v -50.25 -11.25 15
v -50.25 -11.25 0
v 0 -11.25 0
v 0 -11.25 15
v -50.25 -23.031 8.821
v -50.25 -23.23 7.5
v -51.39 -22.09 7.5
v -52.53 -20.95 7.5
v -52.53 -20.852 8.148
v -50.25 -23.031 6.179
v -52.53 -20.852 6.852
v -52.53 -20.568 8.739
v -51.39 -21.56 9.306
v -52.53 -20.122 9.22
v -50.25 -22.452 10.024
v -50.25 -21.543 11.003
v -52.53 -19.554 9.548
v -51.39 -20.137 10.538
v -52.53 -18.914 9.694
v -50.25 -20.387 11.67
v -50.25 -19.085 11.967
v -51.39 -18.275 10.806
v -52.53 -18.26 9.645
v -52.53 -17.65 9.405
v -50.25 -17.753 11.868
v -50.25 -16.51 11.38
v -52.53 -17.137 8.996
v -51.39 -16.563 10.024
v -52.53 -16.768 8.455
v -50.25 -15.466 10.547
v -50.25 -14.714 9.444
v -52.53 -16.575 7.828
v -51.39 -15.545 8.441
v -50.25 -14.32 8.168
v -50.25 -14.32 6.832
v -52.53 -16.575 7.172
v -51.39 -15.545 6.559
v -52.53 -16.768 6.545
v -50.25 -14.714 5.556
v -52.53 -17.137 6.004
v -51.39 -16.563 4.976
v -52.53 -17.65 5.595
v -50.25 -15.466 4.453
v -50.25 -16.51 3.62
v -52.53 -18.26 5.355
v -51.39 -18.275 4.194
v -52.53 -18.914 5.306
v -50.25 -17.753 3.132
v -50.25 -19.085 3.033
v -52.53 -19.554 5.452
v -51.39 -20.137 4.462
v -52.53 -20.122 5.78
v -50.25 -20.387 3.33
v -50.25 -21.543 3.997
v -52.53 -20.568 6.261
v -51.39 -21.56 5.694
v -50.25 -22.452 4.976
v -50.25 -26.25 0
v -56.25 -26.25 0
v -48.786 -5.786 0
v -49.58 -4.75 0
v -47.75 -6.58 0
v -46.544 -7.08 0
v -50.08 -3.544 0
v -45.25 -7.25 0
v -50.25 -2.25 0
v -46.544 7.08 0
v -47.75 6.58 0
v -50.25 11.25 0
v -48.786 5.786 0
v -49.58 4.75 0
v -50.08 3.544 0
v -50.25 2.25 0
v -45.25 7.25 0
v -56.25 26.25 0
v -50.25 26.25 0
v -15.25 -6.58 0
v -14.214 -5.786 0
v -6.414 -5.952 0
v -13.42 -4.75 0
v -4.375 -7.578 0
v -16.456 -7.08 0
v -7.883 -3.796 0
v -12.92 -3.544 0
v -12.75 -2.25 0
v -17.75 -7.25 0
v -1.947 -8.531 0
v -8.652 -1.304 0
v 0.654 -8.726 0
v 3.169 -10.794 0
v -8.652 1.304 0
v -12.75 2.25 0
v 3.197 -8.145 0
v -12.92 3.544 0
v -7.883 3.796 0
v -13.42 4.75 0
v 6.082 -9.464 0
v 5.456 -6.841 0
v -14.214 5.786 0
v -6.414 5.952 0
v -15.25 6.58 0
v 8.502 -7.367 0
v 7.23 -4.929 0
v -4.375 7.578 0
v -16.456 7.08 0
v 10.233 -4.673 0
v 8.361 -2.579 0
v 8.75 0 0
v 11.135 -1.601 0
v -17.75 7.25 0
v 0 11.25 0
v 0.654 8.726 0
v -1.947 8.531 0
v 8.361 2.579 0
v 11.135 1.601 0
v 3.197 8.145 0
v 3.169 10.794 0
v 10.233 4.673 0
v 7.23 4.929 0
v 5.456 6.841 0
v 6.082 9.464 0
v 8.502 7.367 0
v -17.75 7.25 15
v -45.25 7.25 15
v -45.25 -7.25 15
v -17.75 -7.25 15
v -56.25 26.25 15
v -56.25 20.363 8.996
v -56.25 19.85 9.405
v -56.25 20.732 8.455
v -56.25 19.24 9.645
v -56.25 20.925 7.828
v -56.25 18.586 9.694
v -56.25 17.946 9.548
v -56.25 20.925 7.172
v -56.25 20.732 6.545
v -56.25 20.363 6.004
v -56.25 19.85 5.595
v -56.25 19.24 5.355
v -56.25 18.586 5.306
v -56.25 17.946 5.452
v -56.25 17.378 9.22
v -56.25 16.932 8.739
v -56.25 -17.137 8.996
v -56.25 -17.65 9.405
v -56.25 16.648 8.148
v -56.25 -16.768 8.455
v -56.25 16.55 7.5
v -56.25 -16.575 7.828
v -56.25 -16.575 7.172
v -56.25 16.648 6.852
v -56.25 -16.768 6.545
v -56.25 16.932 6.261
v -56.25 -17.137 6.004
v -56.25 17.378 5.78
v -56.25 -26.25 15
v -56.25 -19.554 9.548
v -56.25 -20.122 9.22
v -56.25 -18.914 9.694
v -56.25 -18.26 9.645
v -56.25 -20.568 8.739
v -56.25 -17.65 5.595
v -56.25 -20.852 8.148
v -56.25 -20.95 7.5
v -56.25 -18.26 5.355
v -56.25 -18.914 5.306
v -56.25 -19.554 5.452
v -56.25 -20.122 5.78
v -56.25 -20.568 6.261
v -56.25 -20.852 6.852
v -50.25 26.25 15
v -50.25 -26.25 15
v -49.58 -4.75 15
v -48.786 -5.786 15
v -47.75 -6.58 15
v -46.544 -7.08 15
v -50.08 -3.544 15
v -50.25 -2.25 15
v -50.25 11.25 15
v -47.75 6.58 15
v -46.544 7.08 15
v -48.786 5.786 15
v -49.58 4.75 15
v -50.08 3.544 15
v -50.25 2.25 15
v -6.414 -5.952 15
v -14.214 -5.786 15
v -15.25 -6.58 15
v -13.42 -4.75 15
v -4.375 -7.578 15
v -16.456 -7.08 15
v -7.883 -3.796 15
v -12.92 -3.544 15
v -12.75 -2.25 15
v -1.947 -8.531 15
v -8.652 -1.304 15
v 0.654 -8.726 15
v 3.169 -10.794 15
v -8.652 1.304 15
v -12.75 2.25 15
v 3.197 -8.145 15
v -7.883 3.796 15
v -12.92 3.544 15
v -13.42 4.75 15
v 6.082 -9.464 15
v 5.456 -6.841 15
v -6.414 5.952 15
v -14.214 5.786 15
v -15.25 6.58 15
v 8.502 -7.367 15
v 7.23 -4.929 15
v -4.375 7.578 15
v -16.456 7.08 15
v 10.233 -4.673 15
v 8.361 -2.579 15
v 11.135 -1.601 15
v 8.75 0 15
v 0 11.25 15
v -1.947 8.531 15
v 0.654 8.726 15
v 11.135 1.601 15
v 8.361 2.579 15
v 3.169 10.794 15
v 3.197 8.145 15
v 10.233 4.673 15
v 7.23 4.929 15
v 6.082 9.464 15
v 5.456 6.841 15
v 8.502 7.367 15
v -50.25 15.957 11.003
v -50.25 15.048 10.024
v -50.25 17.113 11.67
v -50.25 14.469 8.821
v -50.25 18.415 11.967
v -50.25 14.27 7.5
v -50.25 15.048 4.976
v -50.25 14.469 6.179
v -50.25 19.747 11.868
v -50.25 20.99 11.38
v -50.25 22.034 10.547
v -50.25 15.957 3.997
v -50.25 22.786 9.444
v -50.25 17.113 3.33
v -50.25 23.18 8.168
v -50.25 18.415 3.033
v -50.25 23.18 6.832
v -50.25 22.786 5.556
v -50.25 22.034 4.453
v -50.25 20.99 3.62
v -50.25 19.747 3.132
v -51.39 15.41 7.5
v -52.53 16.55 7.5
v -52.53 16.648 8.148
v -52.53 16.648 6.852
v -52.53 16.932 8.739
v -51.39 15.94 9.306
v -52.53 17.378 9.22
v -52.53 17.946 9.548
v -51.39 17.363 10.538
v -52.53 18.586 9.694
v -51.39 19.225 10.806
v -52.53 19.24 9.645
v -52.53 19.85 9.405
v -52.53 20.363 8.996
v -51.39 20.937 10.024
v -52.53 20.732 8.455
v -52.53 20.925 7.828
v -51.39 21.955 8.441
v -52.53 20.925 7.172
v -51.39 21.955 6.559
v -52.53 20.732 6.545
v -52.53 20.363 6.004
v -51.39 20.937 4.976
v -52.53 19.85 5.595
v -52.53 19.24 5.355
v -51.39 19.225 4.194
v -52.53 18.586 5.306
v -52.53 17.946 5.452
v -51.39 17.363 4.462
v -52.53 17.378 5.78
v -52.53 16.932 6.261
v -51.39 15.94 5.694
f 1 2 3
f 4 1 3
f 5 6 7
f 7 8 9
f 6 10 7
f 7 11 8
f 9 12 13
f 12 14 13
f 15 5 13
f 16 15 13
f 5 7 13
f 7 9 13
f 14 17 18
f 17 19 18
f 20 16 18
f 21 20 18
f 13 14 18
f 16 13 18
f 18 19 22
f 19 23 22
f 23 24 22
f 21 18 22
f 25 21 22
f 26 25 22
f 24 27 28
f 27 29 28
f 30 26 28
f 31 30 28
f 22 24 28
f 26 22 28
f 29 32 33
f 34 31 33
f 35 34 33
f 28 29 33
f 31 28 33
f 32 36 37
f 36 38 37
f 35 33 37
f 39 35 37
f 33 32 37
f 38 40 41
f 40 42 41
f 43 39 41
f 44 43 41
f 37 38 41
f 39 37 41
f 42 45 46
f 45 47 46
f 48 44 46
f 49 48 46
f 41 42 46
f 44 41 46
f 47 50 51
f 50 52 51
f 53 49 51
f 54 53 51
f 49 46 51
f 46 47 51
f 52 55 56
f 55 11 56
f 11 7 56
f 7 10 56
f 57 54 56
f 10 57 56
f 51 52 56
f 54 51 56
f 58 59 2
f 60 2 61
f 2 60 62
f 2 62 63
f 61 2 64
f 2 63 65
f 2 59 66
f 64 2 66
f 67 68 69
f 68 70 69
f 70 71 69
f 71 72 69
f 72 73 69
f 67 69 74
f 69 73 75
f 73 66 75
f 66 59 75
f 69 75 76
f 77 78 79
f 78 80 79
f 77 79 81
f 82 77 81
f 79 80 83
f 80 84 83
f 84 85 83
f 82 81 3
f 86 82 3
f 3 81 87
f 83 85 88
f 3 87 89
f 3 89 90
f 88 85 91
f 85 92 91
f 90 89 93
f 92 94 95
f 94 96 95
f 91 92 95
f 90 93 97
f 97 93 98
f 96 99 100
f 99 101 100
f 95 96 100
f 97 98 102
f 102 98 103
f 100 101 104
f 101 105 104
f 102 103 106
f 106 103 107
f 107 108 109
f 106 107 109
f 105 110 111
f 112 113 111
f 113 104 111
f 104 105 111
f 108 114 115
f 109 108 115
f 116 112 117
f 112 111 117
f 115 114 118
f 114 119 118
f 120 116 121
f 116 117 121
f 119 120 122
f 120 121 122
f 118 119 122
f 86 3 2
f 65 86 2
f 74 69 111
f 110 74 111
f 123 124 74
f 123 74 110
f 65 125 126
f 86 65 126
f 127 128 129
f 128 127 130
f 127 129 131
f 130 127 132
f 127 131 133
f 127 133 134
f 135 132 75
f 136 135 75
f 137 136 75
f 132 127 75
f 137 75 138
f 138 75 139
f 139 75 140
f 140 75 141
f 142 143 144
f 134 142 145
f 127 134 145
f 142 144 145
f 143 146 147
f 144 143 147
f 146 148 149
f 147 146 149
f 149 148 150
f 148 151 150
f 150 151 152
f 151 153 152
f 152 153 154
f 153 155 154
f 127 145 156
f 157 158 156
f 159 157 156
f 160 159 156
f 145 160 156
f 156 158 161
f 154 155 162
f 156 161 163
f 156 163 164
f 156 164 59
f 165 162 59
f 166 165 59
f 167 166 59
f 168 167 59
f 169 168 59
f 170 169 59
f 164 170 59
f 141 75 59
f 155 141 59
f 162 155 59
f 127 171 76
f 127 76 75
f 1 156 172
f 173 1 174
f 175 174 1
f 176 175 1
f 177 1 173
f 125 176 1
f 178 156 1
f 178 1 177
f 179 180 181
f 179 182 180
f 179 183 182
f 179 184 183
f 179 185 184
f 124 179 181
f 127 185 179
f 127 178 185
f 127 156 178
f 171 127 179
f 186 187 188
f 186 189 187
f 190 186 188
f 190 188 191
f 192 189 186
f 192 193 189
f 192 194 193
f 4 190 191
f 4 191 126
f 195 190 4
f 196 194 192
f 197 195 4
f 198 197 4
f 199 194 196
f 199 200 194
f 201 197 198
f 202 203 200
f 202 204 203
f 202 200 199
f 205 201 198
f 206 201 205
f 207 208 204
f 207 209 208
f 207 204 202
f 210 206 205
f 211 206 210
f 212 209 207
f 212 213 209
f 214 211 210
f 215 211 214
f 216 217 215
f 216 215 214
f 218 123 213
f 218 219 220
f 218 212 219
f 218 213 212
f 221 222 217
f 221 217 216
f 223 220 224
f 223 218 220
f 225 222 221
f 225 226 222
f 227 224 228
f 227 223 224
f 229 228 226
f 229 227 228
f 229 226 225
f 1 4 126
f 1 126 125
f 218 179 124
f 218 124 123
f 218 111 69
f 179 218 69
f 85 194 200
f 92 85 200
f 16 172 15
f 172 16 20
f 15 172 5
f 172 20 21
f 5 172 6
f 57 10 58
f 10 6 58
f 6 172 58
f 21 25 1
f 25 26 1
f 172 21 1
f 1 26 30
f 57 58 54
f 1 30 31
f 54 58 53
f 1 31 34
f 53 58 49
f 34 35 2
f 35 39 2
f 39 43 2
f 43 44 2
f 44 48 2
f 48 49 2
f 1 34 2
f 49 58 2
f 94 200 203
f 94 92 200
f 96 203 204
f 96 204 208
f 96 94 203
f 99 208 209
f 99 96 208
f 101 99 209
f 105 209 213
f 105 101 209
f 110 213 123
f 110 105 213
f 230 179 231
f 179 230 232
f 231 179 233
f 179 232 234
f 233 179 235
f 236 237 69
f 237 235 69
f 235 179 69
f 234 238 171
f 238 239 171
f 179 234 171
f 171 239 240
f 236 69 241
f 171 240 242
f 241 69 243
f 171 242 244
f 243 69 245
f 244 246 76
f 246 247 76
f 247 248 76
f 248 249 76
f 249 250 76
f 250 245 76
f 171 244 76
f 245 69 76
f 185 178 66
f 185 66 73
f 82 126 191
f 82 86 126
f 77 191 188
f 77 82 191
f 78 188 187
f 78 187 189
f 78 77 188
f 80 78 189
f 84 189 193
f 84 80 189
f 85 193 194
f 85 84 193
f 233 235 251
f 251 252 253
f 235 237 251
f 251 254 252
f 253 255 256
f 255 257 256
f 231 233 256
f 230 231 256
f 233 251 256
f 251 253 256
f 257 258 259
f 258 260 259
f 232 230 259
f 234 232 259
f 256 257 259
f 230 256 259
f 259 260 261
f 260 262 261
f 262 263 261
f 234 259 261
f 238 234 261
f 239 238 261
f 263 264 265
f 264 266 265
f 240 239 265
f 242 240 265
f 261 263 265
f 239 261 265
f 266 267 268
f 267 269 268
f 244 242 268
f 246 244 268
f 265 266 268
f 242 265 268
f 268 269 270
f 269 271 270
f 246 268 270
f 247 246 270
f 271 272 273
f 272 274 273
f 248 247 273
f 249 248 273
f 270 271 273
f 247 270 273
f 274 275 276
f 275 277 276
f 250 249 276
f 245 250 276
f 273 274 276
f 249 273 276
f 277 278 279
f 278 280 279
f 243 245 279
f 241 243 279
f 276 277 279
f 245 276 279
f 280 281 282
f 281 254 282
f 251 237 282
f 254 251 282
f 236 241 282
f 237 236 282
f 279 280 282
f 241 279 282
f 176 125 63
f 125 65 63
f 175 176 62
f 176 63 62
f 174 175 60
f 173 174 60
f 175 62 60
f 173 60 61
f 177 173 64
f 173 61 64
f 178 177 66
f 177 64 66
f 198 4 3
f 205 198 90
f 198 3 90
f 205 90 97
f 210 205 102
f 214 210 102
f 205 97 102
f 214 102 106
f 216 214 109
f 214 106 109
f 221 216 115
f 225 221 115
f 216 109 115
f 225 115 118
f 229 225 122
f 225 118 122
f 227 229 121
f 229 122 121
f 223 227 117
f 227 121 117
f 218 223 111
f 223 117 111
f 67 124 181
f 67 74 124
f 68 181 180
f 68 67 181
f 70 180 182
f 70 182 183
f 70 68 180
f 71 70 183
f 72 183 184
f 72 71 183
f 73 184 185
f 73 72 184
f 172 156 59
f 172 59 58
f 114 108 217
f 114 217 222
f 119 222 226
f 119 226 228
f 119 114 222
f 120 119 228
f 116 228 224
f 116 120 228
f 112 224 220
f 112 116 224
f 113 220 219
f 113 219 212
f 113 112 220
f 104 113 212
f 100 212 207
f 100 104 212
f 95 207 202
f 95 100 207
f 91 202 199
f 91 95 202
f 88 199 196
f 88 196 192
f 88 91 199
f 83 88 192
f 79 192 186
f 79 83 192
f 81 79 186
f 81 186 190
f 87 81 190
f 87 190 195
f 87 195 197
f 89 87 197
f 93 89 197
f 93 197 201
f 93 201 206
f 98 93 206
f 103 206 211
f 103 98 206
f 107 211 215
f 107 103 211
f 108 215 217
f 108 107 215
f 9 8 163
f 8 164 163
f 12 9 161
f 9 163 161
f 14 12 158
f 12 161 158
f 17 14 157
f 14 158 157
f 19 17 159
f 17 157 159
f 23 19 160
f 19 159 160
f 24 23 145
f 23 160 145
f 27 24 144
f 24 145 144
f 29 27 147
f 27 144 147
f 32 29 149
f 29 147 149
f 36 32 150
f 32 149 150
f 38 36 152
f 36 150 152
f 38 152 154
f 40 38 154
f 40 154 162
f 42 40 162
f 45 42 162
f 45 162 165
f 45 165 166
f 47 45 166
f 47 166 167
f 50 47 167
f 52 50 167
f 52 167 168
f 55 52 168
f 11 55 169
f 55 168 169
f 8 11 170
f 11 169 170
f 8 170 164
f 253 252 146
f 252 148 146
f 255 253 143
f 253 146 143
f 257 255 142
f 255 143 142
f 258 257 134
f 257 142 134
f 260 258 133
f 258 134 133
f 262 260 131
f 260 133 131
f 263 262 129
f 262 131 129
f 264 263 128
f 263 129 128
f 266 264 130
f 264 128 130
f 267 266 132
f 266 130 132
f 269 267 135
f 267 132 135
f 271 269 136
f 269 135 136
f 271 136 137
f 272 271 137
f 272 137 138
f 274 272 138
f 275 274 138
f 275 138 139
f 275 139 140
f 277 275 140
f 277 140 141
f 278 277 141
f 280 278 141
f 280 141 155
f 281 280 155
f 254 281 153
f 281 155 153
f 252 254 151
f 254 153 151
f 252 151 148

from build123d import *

# Parameters (mm, degrees)
F0_R                 = 8.75
F1_DEPTH             = 15
F4_D                 = 4.4
F4_CSINK_D           = 8.96
F4_CSINK_ANGLE       = 90
F4_ON_F3_D           = 4.4
F4_ON_F3_CSINK_D     = 8.96
F4_ON_F3_CSINK_ANGLE = 90
F5_W                 = 37.5
F5_H                 = 14.5
F6_DEPTH             = 25
F7_R                 = 5


with BuildPart() as f1:
    # F0 (on Top) → F1 (new body)
    with BuildSketch(Plane.XY):
        with BuildLine():
            Line((-50.25, -11.25), (0, -11.25))
            ThreePointArc((0, -11.25), (11.25, 0), (0, 11.25))
            Line((0, 11.25), (-50.25, 11.25))
            Line((-50.25, 11.25), (-50.25, 26.25))
            Line((-50.25, 26.25), (-56.25, 26.25))
            Line((-56.25, 26.25), (-56.25, -26.25))
            Line((-56.25, -26.25), (-50.25, -26.25))
            Line((-50.25, -26.25), (-50.25, -11.25))
        make_face()
        Circle(F0_R, mode=Mode.SUBTRACT)
    extrude(amount=F1_DEPTH)

    # F4 (through all)
    with Locations(Plane.YZ.offset(-50.25)):
        with Locations((-18.75, 7.5)):
            CounterSinkHole(F4_D / 2, F4_CSINK_D / 2, counter_sink_angle=F4_CSINK_ANGLE)

    # F4 on F3 (through all)
    with Locations(Plane.YZ.offset(-50.25)):
        with Locations((18.75, 7.5)):
            CounterSinkHole(F4_ON_F3_D / 2, F4_ON_F3_CSINK_D / 2, counter_sink_angle=F4_ON_F3_CSINK_ANGLE)

    # F5 (on face) → F6 (cut)
    with BuildSketch(Plane.XY.offset(15)):
        with Locations((-31.5, 0)):
            Rectangle(F5_W, F5_H)
    extrude(amount=-F6_DEPTH, mode=Mode.SUBTRACT)

    # F7
    f7_edges = [f1.edges().sort_by_distance(p)[0] for p in [
        (-50.25, 7.25, 7.5),
        (-50.25, -7.25, 7.5),
        (-12.75, 7.25, 7.5),
        (-12.75, -7.25, 7.5),
    ]]
    fillet(f7_edges, radius=F7_R)


solid = f1.part
